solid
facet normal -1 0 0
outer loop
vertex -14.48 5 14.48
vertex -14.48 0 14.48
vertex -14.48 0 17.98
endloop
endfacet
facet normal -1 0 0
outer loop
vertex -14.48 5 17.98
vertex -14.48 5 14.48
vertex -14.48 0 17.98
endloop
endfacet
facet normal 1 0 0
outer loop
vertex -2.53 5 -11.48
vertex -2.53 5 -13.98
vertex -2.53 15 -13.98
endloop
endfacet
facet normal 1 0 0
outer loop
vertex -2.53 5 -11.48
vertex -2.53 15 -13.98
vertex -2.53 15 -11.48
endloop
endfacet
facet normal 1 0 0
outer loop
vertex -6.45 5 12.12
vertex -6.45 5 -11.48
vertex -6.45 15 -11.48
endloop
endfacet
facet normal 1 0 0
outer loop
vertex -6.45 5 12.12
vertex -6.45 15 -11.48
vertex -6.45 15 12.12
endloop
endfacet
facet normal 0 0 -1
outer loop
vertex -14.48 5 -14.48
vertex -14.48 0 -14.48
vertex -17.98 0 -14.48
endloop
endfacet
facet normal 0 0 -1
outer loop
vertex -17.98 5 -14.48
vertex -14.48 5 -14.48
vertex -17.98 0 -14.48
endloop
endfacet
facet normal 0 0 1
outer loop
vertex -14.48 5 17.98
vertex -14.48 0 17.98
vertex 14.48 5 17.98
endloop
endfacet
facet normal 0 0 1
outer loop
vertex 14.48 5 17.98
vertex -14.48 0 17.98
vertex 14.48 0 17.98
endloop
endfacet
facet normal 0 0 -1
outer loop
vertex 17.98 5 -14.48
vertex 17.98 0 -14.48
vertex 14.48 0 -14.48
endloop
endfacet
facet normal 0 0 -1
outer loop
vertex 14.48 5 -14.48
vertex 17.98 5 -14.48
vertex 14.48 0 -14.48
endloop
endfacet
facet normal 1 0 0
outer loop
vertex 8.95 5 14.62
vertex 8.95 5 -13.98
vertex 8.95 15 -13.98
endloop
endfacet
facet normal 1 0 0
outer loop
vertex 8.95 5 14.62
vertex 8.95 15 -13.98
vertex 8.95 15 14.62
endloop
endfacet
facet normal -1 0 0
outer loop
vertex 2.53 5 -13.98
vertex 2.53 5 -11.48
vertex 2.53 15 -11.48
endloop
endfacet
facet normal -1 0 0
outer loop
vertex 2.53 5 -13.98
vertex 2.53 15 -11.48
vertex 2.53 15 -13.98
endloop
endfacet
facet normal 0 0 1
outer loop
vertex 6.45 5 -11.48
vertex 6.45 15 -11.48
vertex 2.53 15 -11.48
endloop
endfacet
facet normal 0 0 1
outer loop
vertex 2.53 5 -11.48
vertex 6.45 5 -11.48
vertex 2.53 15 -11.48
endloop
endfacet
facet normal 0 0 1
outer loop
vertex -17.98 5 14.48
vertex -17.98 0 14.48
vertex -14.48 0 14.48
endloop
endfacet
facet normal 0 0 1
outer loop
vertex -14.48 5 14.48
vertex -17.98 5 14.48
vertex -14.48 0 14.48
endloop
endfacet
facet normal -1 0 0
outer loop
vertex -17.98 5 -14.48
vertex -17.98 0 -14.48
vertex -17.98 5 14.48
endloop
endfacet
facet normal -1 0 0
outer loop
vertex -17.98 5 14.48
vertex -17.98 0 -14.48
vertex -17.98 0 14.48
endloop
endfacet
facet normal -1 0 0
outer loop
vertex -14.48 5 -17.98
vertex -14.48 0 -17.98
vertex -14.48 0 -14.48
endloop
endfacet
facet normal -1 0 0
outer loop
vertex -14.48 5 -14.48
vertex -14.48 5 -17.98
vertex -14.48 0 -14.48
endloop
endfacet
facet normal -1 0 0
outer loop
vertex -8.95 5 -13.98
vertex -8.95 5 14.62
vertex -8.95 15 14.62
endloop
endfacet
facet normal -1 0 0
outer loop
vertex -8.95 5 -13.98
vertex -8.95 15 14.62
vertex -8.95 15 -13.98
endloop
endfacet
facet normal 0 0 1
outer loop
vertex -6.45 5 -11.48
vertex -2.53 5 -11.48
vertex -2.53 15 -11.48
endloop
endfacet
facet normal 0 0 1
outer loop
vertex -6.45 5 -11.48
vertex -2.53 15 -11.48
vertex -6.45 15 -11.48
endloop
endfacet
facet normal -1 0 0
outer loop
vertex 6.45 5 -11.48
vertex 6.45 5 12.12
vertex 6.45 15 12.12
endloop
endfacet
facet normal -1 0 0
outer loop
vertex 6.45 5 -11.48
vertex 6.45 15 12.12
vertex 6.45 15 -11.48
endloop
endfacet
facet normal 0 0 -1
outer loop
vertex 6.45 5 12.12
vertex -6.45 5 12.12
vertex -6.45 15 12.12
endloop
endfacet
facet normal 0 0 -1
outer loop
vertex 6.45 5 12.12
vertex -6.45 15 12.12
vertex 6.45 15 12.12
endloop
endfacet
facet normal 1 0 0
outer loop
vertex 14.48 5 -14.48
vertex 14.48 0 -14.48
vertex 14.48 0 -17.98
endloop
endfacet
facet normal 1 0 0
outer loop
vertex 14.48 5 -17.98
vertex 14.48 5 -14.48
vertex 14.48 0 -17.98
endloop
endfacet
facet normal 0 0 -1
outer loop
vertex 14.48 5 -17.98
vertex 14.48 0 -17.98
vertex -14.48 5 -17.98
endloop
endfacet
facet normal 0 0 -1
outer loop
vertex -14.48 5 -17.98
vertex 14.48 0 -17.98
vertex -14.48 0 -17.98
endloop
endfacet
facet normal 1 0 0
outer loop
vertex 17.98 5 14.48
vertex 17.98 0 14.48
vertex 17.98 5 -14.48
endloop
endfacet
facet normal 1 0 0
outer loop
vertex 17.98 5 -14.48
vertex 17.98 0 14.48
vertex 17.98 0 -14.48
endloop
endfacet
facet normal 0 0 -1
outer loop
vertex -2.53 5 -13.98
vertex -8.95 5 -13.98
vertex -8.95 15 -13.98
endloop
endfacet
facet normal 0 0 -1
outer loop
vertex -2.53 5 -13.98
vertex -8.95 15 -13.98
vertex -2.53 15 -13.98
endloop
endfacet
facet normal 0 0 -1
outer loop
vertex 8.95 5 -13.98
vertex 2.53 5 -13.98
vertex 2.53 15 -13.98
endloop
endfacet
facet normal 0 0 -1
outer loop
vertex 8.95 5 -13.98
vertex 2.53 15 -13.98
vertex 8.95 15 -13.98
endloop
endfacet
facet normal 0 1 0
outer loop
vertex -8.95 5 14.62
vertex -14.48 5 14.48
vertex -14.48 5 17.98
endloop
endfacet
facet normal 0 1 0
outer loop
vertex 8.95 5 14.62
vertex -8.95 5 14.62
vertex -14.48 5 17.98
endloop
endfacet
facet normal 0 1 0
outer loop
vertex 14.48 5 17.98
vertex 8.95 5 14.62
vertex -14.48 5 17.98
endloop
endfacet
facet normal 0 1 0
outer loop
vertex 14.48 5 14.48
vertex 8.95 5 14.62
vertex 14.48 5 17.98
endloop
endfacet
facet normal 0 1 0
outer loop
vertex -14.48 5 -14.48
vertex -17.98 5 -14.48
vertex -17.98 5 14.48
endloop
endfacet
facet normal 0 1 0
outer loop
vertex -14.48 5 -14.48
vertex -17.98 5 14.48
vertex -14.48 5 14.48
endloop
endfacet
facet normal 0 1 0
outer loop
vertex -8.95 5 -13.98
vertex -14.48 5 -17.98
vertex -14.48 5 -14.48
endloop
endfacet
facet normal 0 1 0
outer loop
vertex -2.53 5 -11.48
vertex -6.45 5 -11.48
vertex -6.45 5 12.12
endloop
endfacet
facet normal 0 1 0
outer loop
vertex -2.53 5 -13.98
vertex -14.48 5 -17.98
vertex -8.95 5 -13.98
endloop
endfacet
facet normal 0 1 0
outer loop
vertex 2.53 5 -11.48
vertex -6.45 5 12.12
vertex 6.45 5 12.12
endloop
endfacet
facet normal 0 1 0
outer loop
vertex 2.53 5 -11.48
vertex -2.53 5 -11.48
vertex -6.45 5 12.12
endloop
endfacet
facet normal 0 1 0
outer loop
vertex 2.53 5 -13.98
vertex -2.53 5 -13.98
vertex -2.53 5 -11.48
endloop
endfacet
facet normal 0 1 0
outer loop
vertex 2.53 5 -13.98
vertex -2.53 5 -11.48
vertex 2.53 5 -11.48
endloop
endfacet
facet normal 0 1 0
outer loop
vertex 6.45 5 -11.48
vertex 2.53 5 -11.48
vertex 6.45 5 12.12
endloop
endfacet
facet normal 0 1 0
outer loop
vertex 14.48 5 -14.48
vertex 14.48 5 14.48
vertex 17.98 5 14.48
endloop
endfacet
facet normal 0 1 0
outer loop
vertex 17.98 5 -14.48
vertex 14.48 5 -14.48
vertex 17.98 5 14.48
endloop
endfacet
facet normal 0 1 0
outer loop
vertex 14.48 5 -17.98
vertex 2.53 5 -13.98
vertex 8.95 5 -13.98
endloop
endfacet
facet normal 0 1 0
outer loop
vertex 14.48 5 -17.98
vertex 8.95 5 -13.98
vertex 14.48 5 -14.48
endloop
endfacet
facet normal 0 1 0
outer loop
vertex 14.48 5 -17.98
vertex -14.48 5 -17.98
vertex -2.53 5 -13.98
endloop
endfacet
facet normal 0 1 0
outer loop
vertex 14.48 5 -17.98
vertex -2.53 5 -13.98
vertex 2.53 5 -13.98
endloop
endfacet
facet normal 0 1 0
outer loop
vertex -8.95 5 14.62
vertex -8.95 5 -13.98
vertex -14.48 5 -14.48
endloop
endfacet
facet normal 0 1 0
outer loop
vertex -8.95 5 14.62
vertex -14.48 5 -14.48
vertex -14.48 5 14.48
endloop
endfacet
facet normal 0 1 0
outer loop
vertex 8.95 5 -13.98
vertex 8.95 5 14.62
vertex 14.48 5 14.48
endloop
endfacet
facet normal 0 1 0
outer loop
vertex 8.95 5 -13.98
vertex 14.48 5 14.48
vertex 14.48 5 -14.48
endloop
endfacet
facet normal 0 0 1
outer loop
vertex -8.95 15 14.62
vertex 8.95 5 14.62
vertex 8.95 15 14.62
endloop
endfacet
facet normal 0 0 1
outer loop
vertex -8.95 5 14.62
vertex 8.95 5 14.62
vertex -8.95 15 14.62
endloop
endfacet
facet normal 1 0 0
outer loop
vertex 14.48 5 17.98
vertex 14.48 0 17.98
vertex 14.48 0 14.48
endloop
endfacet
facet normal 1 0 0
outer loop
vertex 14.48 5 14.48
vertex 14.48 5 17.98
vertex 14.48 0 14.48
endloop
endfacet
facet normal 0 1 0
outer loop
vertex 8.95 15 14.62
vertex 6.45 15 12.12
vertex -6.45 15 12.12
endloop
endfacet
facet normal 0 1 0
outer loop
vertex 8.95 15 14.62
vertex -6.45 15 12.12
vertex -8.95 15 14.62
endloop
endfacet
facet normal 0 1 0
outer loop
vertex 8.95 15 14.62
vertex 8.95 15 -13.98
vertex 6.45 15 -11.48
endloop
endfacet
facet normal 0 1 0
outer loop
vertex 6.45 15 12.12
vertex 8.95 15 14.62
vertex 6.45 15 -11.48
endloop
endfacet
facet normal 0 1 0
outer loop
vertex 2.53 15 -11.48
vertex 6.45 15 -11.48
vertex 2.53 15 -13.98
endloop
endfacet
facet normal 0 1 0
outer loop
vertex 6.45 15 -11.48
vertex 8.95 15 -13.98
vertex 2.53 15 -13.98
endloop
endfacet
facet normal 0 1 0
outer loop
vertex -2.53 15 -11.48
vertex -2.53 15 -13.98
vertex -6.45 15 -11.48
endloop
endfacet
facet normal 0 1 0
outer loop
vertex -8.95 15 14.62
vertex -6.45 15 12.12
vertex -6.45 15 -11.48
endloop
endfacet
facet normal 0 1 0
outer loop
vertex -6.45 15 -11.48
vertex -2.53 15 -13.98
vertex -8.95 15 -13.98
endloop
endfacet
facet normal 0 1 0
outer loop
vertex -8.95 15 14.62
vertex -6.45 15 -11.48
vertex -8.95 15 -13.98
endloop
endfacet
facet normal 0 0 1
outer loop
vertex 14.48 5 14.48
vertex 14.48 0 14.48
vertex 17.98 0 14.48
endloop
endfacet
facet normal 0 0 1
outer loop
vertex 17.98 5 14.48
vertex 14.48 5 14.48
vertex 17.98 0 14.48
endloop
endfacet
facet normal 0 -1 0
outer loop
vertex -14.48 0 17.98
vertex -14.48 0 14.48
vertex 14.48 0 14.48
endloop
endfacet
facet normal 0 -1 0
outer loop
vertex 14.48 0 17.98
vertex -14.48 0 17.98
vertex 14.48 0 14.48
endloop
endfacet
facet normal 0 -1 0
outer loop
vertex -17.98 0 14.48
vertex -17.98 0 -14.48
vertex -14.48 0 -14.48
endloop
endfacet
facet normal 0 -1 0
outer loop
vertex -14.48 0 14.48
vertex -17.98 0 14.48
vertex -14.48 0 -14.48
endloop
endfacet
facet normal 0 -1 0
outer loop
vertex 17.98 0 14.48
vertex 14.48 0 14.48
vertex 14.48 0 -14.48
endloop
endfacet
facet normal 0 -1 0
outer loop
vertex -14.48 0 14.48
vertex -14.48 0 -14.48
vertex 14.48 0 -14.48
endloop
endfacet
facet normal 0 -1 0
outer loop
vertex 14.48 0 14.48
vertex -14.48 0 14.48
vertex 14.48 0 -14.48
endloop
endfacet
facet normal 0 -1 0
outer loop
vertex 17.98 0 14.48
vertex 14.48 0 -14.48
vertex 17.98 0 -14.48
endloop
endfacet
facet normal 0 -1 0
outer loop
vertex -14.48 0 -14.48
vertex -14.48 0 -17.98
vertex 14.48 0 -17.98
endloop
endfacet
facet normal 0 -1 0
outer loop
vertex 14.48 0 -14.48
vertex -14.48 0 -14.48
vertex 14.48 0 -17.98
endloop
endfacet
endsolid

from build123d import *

# Parameters (mm, degrees)
BOSS_EXTRUDE18_DEPTH = 5
BOSS_EXTRUDE19_DEPTH = 10


with BuildPart() as part:
    # Sketch21 → Boss-Extrude18 (new body)
    with BuildSketch(Plane(origin=(0, 0, 0), x_dir=(1, 0, 0), z_dir=(0, 1, 0))):
        Polygon((0, 17.98), (-14.48, 17.98), (-14.48, 14.48), (-17.98, 14.48), (-17.98, 0), (-17.98, -14.48), (-14.48, -14.48), (-14.48, -17.98), (0, -17.98), (14.48, -17.98), (14.48, -14.48), (17.98, -14.48), (17.98, 0), (17.98, 14.48), (14.48, 14.48), (14.48, 17.98), align=None)
    extrude(amount=BOSS_EXTRUDE18_DEPTH)

    # Sketch23 → Boss-Extrude19 (add)
    with BuildSketch(Plane(origin=(0, 5, 0), x_dir=(1, 0, 0), z_dir=(0, 1, 0))):
        Polygon((-8.95, 13.98), (-2.53, 13.98), (-2.53, 11.48), (-6.45, 11.48), (-6.45, -12.12), (6.45, -12.12), (6.45, 11.48), (2.53, 11.48), (2.53, 13.98), (8.95, 13.98), (8.95, -14.62), (-8.95, -14.62), align=None)
    extrude(amount=BOSS_EXTRUDE19_DEPTH)


solid = part.part
